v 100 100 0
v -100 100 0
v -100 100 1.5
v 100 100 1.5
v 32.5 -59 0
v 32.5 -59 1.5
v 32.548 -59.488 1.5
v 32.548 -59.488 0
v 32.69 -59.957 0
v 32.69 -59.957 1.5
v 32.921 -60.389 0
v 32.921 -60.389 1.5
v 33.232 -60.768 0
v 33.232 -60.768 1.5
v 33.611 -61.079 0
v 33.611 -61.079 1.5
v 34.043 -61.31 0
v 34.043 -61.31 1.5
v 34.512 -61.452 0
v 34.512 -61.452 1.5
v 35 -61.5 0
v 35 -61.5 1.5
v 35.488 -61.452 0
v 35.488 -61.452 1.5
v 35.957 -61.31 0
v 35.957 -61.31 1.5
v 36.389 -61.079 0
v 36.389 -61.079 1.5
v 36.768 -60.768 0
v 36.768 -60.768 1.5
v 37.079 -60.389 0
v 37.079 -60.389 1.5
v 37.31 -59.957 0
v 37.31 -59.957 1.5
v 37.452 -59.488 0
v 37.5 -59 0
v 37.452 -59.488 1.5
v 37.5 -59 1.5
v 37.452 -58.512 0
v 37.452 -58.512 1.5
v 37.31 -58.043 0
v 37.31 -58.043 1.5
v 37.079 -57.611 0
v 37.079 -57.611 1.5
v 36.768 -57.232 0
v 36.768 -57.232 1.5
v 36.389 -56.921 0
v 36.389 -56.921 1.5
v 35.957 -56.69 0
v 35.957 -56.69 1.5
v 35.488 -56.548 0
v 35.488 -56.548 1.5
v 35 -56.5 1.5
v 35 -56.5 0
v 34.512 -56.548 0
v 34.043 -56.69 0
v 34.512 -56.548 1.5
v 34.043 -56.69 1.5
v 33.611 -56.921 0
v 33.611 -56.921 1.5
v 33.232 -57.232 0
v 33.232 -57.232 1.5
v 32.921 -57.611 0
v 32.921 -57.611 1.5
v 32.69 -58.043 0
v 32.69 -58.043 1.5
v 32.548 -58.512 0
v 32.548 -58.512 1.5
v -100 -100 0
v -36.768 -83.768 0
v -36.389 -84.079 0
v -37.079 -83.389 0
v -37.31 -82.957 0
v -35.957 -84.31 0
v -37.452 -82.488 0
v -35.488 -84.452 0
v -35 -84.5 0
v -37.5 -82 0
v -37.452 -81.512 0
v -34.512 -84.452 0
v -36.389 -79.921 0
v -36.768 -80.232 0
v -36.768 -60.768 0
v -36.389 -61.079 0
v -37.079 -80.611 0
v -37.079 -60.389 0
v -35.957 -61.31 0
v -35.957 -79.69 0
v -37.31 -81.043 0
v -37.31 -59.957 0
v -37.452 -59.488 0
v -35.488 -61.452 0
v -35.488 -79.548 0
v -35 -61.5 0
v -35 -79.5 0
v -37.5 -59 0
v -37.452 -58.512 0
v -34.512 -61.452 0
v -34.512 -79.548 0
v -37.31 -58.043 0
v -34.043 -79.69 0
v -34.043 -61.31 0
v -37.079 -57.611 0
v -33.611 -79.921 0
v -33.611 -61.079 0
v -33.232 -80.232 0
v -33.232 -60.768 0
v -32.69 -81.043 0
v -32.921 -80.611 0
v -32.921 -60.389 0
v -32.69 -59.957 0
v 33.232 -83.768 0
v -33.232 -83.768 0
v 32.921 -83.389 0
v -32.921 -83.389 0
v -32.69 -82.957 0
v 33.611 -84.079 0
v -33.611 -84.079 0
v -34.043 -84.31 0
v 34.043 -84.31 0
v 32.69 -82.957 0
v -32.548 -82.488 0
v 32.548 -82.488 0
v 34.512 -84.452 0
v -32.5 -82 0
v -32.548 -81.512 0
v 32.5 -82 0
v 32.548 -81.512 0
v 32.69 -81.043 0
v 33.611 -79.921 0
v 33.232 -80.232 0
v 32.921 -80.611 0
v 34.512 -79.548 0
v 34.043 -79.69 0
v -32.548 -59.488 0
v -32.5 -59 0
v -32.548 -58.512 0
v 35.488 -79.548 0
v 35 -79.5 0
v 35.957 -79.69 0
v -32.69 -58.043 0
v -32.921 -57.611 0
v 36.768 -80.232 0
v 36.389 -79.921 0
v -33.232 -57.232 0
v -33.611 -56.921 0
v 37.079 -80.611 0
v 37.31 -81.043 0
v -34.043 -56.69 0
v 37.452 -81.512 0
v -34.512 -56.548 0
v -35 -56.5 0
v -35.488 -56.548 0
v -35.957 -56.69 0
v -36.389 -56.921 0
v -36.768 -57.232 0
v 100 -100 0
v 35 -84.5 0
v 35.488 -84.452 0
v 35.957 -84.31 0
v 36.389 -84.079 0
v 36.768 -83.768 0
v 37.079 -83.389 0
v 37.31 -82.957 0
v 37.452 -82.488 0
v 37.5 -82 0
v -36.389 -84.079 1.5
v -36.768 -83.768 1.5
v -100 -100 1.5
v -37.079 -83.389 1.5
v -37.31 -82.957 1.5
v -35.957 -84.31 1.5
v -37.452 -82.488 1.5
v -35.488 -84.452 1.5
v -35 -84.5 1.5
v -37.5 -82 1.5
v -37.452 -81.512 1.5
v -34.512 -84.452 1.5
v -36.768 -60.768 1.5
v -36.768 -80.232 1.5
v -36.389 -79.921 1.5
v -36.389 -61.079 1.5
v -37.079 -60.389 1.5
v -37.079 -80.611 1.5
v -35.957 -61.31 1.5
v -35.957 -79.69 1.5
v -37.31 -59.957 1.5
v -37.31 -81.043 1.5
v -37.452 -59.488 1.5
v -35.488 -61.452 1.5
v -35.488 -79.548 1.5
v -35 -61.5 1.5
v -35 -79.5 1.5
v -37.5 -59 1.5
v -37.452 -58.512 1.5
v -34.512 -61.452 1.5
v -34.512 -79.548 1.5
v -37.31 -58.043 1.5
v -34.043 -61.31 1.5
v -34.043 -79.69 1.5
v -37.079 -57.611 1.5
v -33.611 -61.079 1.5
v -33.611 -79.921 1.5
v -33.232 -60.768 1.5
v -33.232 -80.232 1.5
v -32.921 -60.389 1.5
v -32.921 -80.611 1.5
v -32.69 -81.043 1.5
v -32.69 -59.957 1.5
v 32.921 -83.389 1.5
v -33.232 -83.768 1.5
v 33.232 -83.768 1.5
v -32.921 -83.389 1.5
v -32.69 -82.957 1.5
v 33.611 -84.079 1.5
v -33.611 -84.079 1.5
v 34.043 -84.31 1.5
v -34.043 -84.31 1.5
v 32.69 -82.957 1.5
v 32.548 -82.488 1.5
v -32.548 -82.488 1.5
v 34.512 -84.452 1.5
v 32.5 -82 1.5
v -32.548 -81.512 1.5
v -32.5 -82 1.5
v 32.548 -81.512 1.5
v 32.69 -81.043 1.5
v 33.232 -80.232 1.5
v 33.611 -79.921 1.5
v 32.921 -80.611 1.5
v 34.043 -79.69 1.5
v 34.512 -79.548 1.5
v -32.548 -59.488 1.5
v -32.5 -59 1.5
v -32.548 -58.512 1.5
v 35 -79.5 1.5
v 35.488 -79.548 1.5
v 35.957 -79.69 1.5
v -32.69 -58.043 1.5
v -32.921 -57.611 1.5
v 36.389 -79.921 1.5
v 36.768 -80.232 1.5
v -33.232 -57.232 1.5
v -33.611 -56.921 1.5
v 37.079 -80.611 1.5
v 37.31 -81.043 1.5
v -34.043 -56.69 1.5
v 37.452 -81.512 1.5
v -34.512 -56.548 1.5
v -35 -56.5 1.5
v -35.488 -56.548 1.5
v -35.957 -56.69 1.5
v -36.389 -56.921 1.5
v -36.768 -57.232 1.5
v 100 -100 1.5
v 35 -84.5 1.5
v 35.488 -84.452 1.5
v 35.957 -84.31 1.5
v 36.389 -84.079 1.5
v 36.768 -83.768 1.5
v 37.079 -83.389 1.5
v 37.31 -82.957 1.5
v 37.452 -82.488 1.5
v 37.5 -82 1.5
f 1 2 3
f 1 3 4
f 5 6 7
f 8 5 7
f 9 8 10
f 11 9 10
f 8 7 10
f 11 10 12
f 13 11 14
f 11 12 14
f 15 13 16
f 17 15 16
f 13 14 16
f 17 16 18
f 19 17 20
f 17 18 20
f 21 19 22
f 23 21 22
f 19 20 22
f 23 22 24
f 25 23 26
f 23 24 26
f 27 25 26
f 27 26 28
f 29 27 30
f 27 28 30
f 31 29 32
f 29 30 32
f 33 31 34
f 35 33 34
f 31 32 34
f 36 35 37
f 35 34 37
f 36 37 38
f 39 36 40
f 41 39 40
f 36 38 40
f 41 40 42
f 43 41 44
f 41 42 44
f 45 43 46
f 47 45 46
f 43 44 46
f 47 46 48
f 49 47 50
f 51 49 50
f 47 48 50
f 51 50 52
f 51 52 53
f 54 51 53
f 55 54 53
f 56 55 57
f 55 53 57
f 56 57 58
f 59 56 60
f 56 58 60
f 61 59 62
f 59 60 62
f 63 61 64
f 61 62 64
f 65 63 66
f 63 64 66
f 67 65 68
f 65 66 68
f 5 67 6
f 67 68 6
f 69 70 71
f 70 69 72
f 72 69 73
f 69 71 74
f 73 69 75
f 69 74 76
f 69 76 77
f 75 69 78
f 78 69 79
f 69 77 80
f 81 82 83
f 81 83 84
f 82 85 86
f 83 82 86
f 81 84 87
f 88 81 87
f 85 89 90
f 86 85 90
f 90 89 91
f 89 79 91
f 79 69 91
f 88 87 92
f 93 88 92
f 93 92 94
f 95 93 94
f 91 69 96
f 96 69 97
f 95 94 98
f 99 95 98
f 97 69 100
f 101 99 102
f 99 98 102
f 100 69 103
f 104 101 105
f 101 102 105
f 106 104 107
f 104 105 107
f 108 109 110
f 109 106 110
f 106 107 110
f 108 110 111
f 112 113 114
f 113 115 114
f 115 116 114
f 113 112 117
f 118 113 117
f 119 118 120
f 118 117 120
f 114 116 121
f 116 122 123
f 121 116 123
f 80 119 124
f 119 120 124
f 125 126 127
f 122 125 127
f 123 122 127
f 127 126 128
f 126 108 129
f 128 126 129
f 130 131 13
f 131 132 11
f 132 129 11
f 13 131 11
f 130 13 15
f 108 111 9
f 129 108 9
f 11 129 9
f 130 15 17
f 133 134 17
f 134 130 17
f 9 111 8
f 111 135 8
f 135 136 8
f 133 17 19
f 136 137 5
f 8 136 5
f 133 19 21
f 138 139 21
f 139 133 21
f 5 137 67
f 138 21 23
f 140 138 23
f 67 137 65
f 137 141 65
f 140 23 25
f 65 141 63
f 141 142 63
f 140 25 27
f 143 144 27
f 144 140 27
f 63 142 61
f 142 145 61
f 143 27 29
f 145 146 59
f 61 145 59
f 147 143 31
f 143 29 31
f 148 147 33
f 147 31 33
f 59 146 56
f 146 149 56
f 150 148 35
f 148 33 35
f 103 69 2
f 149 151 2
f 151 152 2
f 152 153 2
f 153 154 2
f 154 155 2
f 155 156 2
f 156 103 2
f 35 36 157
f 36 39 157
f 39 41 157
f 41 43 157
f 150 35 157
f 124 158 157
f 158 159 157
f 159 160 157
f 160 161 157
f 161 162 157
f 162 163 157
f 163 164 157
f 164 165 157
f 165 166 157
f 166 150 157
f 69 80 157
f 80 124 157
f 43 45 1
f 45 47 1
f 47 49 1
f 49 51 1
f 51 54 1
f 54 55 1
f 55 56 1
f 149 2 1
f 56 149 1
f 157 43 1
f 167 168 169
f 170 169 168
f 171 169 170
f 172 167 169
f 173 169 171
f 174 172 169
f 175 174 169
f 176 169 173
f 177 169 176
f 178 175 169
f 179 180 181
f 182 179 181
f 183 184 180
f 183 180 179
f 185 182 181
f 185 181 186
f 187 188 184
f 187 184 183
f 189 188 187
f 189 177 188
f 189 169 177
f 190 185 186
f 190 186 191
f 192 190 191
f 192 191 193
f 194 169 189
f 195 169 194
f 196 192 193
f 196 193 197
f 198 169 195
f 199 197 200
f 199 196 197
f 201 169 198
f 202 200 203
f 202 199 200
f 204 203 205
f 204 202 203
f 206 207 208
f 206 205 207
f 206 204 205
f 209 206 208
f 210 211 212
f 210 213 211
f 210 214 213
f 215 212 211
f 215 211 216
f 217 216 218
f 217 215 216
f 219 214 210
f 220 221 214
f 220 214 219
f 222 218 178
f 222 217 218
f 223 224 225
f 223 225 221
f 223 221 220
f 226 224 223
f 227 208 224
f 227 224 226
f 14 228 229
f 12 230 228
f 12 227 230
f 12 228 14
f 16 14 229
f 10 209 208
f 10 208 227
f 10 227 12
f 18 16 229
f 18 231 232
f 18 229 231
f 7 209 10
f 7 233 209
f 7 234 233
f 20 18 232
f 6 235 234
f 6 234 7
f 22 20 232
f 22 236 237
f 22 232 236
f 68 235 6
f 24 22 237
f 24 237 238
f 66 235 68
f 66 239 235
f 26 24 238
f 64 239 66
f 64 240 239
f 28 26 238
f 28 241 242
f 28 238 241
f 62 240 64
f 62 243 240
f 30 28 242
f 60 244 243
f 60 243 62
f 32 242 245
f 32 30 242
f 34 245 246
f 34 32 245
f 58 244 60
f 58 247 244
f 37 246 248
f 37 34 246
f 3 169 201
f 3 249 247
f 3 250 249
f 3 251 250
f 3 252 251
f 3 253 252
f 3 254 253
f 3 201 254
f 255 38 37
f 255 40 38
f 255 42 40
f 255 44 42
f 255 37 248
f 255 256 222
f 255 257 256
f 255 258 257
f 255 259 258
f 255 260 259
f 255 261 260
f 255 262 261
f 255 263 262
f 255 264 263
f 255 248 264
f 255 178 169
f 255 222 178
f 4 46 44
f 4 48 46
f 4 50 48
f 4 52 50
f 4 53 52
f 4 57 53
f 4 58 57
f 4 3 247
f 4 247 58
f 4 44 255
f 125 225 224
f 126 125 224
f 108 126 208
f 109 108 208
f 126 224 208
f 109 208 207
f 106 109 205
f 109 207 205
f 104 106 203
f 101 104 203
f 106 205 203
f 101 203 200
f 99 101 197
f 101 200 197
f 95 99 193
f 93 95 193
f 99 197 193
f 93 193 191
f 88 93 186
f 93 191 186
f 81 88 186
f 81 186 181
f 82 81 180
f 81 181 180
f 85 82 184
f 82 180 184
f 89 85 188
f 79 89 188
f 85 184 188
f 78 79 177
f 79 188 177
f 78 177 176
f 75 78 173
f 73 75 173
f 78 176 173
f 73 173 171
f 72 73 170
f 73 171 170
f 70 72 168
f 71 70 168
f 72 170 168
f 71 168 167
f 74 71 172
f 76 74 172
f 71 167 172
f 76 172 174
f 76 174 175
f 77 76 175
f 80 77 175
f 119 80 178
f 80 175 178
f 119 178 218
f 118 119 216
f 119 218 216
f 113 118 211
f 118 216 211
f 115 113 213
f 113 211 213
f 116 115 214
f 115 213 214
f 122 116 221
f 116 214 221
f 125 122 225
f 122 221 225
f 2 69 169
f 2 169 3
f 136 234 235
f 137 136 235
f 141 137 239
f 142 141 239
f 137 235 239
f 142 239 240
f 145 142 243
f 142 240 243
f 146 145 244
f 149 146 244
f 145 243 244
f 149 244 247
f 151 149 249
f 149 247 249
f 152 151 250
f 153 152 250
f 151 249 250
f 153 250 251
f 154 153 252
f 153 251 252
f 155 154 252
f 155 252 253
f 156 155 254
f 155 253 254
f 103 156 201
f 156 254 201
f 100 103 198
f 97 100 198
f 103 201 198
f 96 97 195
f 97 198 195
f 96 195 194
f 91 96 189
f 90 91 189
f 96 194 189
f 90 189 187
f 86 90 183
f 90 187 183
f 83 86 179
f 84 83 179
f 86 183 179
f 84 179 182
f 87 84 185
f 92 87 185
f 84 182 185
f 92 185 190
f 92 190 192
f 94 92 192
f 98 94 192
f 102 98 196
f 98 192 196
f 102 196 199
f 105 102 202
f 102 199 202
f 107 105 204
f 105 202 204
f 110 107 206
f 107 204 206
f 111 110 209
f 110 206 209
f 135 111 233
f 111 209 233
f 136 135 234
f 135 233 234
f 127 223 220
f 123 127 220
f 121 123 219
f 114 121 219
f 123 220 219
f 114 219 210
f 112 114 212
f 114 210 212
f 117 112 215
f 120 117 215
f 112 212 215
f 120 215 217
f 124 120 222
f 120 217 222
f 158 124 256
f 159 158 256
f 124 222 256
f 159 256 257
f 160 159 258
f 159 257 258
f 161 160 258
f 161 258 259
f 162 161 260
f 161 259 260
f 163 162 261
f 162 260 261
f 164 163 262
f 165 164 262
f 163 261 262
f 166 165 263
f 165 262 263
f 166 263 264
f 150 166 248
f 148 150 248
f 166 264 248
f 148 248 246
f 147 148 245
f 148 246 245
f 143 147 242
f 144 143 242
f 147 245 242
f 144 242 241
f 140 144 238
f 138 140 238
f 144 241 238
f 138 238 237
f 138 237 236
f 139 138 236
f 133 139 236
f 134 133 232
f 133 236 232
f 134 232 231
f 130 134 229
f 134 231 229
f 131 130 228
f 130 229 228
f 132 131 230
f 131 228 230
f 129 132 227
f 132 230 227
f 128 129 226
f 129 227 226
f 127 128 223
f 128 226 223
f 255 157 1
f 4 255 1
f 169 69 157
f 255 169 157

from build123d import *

# Parameters (mm, degrees)
SKETCH_1_W          = 200
SKETCH_1_H          = 200
EXTRUDE_1_DEPTH     = 1.5
SKETCH_2_R          = 2.5
CUT_EXTRUDE_1_DEPTH = 1.5


with BuildPart() as part:
    # 草图1 → 凸台-拉伸1 (new body)
    with BuildSketch(Plane.XY):
        Rectangle(SKETCH_1_W, SKETCH_1_H)
    extrude(amount=EXTRUDE_1_DEPTH)

    # 草图2 → 切除-拉伸1 (cut)
    with BuildSketch(Plane.XY.offset(1.5)):
        with Locations((-35, -82)):
            Circle(SKETCH_2_R)
        with Locations((-35, -59)):
            Circle(SKETCH_2_R)
        with Locations(Location((35, -82, 0), (0, 0, 180))):
            Circle(SKETCH_2_R)
        with Locations(Location((35, -59, 0), (0, 0, 180))):
            Circle(SKETCH_2_R)
    extrude(amount=-CUT_EXTRUDE_1_DEPTH, mode=Mode.SUBTRACT)


solid = part.part
